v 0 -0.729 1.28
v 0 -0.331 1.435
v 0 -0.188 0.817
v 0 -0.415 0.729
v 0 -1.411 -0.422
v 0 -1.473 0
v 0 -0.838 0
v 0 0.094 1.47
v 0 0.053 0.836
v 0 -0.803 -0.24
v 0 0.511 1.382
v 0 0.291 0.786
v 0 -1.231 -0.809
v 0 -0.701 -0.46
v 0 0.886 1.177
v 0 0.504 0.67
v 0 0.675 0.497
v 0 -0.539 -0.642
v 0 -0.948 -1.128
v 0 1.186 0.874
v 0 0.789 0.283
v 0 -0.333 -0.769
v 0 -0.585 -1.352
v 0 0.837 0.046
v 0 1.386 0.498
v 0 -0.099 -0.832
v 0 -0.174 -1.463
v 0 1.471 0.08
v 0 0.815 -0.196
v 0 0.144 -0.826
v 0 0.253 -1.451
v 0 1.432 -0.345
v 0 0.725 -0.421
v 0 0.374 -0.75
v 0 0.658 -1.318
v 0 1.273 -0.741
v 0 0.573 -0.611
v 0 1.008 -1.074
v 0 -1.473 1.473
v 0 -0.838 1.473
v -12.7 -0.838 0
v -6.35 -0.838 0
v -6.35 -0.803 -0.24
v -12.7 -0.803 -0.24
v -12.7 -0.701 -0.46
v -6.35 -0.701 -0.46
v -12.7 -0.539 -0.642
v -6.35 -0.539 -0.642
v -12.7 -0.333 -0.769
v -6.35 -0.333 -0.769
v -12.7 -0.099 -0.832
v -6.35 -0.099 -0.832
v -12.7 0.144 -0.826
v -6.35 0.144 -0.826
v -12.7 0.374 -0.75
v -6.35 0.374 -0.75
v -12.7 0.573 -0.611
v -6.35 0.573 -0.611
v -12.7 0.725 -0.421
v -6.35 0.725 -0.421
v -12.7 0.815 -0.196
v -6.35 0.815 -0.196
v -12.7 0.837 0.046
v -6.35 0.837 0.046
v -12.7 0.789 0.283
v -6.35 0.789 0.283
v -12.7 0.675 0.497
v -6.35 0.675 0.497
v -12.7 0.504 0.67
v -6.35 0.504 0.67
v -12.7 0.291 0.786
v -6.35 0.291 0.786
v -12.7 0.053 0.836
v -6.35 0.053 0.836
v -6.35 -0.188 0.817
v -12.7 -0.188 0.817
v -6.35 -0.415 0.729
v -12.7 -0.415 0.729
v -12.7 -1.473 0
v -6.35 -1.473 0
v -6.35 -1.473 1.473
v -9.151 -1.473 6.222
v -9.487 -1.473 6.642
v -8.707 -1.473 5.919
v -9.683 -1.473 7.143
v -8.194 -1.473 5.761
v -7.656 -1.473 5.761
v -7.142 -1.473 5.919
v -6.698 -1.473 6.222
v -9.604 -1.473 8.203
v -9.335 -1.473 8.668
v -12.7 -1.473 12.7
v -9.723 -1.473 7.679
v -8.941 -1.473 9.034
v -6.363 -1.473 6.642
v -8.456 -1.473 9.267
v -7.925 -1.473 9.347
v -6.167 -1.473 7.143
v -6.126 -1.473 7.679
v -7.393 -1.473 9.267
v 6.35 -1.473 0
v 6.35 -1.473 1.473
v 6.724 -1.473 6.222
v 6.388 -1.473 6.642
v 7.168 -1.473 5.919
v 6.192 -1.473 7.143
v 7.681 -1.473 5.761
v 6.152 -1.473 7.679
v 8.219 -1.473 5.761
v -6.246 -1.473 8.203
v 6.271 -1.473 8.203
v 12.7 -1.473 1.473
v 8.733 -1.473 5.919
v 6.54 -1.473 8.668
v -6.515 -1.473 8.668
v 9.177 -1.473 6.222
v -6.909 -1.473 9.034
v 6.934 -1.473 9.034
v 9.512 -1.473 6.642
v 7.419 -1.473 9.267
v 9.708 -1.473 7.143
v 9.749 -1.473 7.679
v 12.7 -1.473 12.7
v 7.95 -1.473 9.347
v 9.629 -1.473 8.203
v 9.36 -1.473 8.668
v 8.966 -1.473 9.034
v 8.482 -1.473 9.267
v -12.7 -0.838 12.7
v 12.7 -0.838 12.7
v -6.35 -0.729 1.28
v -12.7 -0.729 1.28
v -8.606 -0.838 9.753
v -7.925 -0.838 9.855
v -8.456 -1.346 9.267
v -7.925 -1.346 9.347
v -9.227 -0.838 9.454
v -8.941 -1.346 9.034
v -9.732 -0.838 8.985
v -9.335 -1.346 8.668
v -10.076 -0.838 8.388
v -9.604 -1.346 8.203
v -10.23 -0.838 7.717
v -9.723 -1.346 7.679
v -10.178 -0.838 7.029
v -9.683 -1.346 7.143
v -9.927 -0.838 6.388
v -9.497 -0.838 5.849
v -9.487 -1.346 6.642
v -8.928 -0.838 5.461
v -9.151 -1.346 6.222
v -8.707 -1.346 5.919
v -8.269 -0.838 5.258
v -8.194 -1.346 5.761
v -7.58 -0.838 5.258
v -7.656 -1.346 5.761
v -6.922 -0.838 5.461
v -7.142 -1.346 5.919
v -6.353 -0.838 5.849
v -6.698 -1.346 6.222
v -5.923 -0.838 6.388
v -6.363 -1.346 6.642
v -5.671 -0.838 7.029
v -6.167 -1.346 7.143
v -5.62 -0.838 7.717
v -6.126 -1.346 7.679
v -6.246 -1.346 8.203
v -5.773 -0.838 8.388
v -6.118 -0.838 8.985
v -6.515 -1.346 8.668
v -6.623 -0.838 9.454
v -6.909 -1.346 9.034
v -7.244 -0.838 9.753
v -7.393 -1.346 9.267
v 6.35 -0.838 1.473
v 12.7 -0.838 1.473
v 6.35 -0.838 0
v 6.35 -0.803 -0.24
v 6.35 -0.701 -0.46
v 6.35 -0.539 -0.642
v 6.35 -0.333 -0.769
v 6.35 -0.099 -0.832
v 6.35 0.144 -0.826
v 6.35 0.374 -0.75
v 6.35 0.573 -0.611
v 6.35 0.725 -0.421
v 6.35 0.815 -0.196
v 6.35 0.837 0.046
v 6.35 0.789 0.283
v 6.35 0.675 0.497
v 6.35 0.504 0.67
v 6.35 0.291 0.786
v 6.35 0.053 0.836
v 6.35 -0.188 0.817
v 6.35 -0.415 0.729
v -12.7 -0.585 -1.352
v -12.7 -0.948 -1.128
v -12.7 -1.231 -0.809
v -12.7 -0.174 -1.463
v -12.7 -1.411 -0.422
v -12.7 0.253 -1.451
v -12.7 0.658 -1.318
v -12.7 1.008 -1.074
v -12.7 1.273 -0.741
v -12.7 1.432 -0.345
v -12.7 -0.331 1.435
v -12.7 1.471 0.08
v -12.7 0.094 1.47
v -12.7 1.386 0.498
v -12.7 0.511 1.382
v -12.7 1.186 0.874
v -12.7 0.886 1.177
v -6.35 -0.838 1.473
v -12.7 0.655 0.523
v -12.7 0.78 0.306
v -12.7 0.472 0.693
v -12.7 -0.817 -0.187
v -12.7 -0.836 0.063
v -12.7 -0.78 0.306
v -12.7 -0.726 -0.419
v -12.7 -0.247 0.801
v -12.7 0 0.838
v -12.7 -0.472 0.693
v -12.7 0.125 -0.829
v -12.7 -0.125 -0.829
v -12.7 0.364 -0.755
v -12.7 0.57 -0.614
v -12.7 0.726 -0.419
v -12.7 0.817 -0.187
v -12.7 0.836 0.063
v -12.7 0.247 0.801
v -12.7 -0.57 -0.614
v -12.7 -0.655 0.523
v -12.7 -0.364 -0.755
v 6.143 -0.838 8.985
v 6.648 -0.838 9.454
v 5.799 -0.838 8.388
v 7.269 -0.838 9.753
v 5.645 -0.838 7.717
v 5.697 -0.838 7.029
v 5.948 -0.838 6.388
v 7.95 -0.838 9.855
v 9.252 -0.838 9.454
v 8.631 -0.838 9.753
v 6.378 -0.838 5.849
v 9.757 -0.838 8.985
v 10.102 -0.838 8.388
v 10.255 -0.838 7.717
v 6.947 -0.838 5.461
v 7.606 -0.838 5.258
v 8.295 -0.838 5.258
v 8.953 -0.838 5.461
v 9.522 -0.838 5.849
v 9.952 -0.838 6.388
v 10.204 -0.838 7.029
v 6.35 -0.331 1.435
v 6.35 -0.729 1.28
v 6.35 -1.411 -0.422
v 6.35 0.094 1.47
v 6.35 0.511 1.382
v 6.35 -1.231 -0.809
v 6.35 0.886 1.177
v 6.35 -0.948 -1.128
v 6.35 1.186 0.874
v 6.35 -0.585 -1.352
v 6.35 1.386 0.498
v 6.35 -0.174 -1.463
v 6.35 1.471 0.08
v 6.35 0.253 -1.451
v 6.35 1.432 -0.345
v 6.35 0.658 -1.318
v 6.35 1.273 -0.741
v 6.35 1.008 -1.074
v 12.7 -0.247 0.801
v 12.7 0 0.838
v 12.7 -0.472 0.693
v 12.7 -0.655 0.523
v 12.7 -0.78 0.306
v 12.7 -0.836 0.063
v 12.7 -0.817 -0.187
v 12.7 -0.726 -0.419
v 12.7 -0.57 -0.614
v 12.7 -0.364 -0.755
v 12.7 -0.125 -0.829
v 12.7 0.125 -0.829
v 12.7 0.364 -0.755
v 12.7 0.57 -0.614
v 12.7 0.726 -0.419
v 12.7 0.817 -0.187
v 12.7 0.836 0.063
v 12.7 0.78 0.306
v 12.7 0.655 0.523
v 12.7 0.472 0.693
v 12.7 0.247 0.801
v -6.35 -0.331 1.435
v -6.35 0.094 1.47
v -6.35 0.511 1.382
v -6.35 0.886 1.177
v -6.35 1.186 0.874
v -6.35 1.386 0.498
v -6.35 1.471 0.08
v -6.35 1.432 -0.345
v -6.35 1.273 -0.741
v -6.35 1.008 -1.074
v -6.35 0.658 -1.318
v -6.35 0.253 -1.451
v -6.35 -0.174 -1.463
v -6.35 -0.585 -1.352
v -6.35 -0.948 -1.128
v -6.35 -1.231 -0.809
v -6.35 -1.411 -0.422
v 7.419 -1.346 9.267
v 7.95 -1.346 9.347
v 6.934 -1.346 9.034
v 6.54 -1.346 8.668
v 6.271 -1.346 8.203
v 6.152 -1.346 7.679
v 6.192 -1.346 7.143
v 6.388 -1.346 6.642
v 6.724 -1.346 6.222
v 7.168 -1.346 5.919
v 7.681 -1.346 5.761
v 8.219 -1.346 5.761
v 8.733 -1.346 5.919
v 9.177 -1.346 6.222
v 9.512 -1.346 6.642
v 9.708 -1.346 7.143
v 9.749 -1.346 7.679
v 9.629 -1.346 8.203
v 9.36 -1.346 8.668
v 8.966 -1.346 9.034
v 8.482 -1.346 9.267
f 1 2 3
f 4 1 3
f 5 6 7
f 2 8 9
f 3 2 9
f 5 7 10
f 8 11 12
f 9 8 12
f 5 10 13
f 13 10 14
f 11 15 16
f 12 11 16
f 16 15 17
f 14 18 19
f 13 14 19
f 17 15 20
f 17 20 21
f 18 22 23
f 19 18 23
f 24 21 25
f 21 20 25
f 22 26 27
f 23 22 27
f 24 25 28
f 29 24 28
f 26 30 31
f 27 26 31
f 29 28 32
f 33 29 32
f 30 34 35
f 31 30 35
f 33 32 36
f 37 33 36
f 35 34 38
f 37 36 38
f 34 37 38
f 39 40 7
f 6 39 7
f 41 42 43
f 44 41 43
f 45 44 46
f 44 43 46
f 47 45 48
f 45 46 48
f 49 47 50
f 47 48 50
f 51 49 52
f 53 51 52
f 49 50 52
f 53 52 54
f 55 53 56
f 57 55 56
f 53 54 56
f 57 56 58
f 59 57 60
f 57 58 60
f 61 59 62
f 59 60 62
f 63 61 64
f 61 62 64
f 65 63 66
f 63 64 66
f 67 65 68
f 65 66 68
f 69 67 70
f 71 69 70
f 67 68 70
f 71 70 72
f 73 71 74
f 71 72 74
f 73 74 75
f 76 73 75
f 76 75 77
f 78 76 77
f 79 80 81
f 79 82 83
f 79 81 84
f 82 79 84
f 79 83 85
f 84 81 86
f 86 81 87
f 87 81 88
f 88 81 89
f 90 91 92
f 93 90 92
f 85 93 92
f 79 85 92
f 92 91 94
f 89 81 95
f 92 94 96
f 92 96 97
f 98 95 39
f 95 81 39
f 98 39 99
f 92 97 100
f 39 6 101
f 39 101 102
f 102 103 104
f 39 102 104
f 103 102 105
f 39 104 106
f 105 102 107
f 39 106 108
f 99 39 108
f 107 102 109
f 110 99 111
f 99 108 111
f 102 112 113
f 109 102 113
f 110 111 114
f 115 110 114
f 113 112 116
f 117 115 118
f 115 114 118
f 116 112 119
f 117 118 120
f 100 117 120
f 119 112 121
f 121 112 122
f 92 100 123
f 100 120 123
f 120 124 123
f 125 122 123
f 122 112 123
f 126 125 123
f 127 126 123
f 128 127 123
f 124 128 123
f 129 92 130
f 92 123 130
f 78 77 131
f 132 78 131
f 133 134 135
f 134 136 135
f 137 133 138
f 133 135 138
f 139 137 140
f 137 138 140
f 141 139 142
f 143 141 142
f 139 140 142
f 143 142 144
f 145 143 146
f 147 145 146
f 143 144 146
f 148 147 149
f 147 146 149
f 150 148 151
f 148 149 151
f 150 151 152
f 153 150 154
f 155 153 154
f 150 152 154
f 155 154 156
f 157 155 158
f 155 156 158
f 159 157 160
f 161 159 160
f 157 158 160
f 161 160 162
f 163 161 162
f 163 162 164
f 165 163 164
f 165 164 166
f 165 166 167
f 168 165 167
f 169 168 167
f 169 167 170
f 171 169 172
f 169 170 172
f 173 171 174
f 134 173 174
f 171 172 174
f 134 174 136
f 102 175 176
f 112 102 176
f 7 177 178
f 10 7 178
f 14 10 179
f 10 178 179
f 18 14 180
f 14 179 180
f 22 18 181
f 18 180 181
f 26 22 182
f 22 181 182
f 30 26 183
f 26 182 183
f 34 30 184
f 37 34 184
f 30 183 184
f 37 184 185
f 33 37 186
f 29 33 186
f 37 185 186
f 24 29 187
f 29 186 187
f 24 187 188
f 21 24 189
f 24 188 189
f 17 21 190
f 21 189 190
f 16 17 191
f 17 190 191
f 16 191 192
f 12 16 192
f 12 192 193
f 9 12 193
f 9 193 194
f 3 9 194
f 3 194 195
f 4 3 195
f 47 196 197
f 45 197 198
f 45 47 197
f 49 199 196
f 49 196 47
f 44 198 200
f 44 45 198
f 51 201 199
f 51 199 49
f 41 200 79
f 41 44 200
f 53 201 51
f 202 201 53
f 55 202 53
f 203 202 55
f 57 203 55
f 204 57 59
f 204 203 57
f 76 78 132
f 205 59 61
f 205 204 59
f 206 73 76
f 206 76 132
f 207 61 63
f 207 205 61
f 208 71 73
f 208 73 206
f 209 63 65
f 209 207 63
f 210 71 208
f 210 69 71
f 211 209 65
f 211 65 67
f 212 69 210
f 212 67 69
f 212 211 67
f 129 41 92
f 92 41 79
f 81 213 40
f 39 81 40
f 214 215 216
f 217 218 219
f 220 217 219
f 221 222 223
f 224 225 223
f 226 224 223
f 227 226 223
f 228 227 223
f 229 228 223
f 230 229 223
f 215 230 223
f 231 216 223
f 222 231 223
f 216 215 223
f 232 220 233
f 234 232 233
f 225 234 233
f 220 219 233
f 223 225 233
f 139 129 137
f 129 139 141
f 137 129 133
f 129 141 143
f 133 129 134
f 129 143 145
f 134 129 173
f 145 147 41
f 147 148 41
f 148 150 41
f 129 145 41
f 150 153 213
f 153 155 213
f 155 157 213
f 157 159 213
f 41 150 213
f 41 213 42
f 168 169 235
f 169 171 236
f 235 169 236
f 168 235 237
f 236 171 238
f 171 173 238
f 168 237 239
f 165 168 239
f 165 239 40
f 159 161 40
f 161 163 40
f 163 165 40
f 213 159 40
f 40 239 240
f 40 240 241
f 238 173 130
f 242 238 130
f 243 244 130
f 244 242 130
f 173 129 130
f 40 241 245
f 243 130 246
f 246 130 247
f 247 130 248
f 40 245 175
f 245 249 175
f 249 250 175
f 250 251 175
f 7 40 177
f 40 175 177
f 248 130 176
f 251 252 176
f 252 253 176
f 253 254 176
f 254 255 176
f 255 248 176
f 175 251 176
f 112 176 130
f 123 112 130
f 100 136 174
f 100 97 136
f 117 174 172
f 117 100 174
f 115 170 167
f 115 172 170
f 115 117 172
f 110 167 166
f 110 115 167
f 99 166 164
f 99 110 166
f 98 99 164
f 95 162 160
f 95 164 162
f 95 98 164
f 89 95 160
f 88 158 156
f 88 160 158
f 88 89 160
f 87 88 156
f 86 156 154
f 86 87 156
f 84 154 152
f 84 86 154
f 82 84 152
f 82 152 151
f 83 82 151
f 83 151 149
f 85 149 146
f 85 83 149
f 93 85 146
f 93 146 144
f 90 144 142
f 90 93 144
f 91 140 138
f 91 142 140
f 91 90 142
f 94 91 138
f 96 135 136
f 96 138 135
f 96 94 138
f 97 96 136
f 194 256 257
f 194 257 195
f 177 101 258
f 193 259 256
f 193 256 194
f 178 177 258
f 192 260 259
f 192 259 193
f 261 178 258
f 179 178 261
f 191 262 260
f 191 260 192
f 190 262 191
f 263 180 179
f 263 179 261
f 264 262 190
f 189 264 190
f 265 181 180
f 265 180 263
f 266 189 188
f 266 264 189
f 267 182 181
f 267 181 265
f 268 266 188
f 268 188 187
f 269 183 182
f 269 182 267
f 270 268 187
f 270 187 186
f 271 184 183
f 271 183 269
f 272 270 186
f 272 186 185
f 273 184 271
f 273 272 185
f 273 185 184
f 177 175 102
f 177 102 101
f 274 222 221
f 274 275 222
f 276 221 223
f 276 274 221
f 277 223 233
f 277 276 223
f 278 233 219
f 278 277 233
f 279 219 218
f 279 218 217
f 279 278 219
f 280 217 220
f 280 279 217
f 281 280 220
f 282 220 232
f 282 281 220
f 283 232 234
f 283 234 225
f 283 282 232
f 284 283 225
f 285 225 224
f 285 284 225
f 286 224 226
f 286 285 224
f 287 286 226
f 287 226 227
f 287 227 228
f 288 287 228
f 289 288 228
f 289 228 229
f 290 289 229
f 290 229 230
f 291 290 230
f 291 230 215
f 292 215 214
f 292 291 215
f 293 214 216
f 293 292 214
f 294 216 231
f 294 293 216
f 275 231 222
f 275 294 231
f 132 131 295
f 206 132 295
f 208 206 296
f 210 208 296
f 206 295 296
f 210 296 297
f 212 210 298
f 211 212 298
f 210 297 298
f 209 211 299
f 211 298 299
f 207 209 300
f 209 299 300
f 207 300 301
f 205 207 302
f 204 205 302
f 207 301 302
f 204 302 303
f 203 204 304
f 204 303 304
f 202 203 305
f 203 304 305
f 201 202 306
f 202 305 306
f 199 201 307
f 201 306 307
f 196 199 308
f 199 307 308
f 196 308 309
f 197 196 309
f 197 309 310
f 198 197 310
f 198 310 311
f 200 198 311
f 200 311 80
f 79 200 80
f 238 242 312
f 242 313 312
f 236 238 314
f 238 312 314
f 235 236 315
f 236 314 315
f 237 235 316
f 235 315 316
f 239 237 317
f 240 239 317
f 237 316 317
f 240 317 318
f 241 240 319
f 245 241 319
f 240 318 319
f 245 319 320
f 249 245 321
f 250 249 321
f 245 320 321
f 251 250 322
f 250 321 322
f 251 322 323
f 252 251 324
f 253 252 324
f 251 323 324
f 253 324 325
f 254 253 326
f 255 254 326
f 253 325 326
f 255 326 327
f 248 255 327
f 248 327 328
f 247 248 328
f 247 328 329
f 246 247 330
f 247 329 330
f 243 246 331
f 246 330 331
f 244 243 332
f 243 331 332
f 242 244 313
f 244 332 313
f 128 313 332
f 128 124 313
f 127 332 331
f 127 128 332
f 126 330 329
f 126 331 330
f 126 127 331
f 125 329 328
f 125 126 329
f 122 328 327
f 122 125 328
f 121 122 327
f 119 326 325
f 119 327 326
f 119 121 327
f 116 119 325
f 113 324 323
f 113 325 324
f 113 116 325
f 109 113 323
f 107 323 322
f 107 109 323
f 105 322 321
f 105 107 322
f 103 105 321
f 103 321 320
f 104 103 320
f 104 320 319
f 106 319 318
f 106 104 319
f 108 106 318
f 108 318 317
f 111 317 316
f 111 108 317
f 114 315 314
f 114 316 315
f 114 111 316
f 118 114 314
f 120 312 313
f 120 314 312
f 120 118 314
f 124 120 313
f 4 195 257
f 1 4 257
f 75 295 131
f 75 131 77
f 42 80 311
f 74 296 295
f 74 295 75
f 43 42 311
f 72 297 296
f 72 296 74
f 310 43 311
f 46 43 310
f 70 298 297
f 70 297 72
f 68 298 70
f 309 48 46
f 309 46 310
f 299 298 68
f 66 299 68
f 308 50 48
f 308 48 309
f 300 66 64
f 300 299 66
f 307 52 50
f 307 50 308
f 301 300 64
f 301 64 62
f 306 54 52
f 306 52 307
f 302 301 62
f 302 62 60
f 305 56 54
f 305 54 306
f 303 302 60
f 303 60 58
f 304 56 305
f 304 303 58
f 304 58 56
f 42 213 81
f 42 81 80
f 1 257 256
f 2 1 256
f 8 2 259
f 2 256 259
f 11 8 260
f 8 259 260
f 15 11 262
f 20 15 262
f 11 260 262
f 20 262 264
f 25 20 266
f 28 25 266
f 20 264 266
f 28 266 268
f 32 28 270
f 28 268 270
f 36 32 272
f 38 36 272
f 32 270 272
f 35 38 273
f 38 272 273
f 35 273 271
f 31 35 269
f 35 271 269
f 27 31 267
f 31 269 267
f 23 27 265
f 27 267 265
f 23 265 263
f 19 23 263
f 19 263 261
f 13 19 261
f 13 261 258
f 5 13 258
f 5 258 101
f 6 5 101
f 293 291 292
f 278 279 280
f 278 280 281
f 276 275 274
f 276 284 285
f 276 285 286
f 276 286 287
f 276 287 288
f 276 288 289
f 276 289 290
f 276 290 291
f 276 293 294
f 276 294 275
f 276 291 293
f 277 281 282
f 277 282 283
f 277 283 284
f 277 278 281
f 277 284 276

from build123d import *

# Parameters (mm, degrees)
BOSS_EXTRUDE1_DEPTH     = 12.7
SKETCH4_W               = 6.35
SKETCH4_H               = 2.9464
CUT_EXTRUDE1_DEPTH      = 19.020830121
LPATTERN1_COUNT         = 6
LPATTERN1_PITCH         = 12.7
CUT_EXTRUDE3_DEPTH      = 19.020830121
CUT_EXTRUDE3_DEPTH_BACK = 19.020830121
SKETCH9_R               = 1.8034
SKETCH6_R               = 0.8382
BOSS_EXTRUDE2_DEPTH     = 12.7


with BuildPart() as part:
    # Sketch3 → Boss-Extrude1 (new, symmetric)
    with BuildSketch(Plane(origin=(0, 0, 0), x_dir=(0, 0, -1), z_dir=(1, 0, 0))):
        with BuildLine():
            Line((0, -1.4732), (-12.7, -1.4732))
            Line((-12.7, -1.4732), (-12.7, -0.8382))
            Line((-12.7, -0.8382), (0, -0.8382))
            ThreePointArc((0, -0.8382), (0.421388638, 0.724576328), (-0.728533124, -0.414510226))
            Line((-0.728533124, -0.414510226), (-1.280452157, -0.728533124))
            ThreePointArc((-1.280452157, -0.728533124), (0.740622455, 1.273497789), (0, -1.4732))
        make_face()
    extrude(amount=BOSS_EXTRUDE1_DEPTH, both=True)

    # Sketch4 → Cut-Extrude1 (cut, symmetric)
    with BuildSketch(Plane(origin=(0, 0, 0), x_dir=(1, 0, 0), z_dir=(0, 1, 0))):
        with Locations((-3.175, 0)):
            Rectangle(SKETCH4_W, SKETCH4_H)
    cut_extrude1 = extrude(amount=CUT_EXTRUDE1_DEPTH, both=True, mode=Mode.SUBTRACT)

    # LPattern1: Cut-Extrude1 ×6
    with Locations(*[(i * LPATTERN1_PITCH, 0, 0) for i in range(1, LPATTERN1_COUNT)]):
        add(cut_extrude1, mode=Mode.SUBTRACT)

    # Cut-Extrude2 cone 1 section (through the dimple's axis) → Cut-Extrude2 (revolve, cut)
    with BuildSketch(Plane(origin=(7.9502, -0.8382, 7.5438), x_dir=(0, 0, 1), z_dir=(1, 0, 0))):
        Polygon((0, 0), (2.3114, 0), (0, 2.3114), align=None)
    revolve(axis=Axis((7.9502, -0.8382, 7.5438), (0, -1, 0)), mode=Mode.SUBTRACT)

    # Cut-Extrude2 cone 2 section (through the dimple's axis) → Cut-Extrude2 cone 2 (revolve, cut)
    with BuildSketch(Plane(origin=(-7.9248, -0.8382, 7.5438), x_dir=(0, 0, 1), z_dir=(1, 0, 0))):
        Polygon((0, 0), (2.3114, 0), (0, 2.3114), align=None)
    revolve(axis=Axis((-7.9248, -0.8382, 7.5438), (0, -1, 0)), mode=Mode.SUBTRACT)

    # Sketch9 → Cut-Extrude3 (cut, two sides: drawn at the far end of the back side and taken through both)
    with BuildSketch(Plane(origin=(0, 0, 0), x_dir=(1, 0, 0), z_dir=(0, 1, 0)).offset(-CUT_EXTRUDE3_DEPTH_BACK)):
        with Locations(Location((7.9502, -7.5438, 0), (0, 0, 270))):
            Circle(SKETCH9_R)
        with Locations(Location((-7.9248, -7.5438, 0), (0, 0, 270))):
            Circle(SKETCH9_R)
    extrude(amount=CUT_EXTRUDE3_DEPTH + CUT_EXTRUDE3_DEPTH_BACK, mode=Mode.SUBTRACT)


with BuildPart() as body_2:
    # Sketch6 → Boss-Extrude2 (new, symmetric)
    with BuildSketch(Plane(origin=(0, 0, 0), x_dir=(0, 0, -1), z_dir=(1, 0, 0))):
        with Locations(Location((0, 0, 0), (0, 0, 180))):
            Circle(SKETCH6_R)
    extrude(amount=BOSS_EXTRUDE2_DEPTH, both=True)


solid = Compound([part.part, body_2.part])
